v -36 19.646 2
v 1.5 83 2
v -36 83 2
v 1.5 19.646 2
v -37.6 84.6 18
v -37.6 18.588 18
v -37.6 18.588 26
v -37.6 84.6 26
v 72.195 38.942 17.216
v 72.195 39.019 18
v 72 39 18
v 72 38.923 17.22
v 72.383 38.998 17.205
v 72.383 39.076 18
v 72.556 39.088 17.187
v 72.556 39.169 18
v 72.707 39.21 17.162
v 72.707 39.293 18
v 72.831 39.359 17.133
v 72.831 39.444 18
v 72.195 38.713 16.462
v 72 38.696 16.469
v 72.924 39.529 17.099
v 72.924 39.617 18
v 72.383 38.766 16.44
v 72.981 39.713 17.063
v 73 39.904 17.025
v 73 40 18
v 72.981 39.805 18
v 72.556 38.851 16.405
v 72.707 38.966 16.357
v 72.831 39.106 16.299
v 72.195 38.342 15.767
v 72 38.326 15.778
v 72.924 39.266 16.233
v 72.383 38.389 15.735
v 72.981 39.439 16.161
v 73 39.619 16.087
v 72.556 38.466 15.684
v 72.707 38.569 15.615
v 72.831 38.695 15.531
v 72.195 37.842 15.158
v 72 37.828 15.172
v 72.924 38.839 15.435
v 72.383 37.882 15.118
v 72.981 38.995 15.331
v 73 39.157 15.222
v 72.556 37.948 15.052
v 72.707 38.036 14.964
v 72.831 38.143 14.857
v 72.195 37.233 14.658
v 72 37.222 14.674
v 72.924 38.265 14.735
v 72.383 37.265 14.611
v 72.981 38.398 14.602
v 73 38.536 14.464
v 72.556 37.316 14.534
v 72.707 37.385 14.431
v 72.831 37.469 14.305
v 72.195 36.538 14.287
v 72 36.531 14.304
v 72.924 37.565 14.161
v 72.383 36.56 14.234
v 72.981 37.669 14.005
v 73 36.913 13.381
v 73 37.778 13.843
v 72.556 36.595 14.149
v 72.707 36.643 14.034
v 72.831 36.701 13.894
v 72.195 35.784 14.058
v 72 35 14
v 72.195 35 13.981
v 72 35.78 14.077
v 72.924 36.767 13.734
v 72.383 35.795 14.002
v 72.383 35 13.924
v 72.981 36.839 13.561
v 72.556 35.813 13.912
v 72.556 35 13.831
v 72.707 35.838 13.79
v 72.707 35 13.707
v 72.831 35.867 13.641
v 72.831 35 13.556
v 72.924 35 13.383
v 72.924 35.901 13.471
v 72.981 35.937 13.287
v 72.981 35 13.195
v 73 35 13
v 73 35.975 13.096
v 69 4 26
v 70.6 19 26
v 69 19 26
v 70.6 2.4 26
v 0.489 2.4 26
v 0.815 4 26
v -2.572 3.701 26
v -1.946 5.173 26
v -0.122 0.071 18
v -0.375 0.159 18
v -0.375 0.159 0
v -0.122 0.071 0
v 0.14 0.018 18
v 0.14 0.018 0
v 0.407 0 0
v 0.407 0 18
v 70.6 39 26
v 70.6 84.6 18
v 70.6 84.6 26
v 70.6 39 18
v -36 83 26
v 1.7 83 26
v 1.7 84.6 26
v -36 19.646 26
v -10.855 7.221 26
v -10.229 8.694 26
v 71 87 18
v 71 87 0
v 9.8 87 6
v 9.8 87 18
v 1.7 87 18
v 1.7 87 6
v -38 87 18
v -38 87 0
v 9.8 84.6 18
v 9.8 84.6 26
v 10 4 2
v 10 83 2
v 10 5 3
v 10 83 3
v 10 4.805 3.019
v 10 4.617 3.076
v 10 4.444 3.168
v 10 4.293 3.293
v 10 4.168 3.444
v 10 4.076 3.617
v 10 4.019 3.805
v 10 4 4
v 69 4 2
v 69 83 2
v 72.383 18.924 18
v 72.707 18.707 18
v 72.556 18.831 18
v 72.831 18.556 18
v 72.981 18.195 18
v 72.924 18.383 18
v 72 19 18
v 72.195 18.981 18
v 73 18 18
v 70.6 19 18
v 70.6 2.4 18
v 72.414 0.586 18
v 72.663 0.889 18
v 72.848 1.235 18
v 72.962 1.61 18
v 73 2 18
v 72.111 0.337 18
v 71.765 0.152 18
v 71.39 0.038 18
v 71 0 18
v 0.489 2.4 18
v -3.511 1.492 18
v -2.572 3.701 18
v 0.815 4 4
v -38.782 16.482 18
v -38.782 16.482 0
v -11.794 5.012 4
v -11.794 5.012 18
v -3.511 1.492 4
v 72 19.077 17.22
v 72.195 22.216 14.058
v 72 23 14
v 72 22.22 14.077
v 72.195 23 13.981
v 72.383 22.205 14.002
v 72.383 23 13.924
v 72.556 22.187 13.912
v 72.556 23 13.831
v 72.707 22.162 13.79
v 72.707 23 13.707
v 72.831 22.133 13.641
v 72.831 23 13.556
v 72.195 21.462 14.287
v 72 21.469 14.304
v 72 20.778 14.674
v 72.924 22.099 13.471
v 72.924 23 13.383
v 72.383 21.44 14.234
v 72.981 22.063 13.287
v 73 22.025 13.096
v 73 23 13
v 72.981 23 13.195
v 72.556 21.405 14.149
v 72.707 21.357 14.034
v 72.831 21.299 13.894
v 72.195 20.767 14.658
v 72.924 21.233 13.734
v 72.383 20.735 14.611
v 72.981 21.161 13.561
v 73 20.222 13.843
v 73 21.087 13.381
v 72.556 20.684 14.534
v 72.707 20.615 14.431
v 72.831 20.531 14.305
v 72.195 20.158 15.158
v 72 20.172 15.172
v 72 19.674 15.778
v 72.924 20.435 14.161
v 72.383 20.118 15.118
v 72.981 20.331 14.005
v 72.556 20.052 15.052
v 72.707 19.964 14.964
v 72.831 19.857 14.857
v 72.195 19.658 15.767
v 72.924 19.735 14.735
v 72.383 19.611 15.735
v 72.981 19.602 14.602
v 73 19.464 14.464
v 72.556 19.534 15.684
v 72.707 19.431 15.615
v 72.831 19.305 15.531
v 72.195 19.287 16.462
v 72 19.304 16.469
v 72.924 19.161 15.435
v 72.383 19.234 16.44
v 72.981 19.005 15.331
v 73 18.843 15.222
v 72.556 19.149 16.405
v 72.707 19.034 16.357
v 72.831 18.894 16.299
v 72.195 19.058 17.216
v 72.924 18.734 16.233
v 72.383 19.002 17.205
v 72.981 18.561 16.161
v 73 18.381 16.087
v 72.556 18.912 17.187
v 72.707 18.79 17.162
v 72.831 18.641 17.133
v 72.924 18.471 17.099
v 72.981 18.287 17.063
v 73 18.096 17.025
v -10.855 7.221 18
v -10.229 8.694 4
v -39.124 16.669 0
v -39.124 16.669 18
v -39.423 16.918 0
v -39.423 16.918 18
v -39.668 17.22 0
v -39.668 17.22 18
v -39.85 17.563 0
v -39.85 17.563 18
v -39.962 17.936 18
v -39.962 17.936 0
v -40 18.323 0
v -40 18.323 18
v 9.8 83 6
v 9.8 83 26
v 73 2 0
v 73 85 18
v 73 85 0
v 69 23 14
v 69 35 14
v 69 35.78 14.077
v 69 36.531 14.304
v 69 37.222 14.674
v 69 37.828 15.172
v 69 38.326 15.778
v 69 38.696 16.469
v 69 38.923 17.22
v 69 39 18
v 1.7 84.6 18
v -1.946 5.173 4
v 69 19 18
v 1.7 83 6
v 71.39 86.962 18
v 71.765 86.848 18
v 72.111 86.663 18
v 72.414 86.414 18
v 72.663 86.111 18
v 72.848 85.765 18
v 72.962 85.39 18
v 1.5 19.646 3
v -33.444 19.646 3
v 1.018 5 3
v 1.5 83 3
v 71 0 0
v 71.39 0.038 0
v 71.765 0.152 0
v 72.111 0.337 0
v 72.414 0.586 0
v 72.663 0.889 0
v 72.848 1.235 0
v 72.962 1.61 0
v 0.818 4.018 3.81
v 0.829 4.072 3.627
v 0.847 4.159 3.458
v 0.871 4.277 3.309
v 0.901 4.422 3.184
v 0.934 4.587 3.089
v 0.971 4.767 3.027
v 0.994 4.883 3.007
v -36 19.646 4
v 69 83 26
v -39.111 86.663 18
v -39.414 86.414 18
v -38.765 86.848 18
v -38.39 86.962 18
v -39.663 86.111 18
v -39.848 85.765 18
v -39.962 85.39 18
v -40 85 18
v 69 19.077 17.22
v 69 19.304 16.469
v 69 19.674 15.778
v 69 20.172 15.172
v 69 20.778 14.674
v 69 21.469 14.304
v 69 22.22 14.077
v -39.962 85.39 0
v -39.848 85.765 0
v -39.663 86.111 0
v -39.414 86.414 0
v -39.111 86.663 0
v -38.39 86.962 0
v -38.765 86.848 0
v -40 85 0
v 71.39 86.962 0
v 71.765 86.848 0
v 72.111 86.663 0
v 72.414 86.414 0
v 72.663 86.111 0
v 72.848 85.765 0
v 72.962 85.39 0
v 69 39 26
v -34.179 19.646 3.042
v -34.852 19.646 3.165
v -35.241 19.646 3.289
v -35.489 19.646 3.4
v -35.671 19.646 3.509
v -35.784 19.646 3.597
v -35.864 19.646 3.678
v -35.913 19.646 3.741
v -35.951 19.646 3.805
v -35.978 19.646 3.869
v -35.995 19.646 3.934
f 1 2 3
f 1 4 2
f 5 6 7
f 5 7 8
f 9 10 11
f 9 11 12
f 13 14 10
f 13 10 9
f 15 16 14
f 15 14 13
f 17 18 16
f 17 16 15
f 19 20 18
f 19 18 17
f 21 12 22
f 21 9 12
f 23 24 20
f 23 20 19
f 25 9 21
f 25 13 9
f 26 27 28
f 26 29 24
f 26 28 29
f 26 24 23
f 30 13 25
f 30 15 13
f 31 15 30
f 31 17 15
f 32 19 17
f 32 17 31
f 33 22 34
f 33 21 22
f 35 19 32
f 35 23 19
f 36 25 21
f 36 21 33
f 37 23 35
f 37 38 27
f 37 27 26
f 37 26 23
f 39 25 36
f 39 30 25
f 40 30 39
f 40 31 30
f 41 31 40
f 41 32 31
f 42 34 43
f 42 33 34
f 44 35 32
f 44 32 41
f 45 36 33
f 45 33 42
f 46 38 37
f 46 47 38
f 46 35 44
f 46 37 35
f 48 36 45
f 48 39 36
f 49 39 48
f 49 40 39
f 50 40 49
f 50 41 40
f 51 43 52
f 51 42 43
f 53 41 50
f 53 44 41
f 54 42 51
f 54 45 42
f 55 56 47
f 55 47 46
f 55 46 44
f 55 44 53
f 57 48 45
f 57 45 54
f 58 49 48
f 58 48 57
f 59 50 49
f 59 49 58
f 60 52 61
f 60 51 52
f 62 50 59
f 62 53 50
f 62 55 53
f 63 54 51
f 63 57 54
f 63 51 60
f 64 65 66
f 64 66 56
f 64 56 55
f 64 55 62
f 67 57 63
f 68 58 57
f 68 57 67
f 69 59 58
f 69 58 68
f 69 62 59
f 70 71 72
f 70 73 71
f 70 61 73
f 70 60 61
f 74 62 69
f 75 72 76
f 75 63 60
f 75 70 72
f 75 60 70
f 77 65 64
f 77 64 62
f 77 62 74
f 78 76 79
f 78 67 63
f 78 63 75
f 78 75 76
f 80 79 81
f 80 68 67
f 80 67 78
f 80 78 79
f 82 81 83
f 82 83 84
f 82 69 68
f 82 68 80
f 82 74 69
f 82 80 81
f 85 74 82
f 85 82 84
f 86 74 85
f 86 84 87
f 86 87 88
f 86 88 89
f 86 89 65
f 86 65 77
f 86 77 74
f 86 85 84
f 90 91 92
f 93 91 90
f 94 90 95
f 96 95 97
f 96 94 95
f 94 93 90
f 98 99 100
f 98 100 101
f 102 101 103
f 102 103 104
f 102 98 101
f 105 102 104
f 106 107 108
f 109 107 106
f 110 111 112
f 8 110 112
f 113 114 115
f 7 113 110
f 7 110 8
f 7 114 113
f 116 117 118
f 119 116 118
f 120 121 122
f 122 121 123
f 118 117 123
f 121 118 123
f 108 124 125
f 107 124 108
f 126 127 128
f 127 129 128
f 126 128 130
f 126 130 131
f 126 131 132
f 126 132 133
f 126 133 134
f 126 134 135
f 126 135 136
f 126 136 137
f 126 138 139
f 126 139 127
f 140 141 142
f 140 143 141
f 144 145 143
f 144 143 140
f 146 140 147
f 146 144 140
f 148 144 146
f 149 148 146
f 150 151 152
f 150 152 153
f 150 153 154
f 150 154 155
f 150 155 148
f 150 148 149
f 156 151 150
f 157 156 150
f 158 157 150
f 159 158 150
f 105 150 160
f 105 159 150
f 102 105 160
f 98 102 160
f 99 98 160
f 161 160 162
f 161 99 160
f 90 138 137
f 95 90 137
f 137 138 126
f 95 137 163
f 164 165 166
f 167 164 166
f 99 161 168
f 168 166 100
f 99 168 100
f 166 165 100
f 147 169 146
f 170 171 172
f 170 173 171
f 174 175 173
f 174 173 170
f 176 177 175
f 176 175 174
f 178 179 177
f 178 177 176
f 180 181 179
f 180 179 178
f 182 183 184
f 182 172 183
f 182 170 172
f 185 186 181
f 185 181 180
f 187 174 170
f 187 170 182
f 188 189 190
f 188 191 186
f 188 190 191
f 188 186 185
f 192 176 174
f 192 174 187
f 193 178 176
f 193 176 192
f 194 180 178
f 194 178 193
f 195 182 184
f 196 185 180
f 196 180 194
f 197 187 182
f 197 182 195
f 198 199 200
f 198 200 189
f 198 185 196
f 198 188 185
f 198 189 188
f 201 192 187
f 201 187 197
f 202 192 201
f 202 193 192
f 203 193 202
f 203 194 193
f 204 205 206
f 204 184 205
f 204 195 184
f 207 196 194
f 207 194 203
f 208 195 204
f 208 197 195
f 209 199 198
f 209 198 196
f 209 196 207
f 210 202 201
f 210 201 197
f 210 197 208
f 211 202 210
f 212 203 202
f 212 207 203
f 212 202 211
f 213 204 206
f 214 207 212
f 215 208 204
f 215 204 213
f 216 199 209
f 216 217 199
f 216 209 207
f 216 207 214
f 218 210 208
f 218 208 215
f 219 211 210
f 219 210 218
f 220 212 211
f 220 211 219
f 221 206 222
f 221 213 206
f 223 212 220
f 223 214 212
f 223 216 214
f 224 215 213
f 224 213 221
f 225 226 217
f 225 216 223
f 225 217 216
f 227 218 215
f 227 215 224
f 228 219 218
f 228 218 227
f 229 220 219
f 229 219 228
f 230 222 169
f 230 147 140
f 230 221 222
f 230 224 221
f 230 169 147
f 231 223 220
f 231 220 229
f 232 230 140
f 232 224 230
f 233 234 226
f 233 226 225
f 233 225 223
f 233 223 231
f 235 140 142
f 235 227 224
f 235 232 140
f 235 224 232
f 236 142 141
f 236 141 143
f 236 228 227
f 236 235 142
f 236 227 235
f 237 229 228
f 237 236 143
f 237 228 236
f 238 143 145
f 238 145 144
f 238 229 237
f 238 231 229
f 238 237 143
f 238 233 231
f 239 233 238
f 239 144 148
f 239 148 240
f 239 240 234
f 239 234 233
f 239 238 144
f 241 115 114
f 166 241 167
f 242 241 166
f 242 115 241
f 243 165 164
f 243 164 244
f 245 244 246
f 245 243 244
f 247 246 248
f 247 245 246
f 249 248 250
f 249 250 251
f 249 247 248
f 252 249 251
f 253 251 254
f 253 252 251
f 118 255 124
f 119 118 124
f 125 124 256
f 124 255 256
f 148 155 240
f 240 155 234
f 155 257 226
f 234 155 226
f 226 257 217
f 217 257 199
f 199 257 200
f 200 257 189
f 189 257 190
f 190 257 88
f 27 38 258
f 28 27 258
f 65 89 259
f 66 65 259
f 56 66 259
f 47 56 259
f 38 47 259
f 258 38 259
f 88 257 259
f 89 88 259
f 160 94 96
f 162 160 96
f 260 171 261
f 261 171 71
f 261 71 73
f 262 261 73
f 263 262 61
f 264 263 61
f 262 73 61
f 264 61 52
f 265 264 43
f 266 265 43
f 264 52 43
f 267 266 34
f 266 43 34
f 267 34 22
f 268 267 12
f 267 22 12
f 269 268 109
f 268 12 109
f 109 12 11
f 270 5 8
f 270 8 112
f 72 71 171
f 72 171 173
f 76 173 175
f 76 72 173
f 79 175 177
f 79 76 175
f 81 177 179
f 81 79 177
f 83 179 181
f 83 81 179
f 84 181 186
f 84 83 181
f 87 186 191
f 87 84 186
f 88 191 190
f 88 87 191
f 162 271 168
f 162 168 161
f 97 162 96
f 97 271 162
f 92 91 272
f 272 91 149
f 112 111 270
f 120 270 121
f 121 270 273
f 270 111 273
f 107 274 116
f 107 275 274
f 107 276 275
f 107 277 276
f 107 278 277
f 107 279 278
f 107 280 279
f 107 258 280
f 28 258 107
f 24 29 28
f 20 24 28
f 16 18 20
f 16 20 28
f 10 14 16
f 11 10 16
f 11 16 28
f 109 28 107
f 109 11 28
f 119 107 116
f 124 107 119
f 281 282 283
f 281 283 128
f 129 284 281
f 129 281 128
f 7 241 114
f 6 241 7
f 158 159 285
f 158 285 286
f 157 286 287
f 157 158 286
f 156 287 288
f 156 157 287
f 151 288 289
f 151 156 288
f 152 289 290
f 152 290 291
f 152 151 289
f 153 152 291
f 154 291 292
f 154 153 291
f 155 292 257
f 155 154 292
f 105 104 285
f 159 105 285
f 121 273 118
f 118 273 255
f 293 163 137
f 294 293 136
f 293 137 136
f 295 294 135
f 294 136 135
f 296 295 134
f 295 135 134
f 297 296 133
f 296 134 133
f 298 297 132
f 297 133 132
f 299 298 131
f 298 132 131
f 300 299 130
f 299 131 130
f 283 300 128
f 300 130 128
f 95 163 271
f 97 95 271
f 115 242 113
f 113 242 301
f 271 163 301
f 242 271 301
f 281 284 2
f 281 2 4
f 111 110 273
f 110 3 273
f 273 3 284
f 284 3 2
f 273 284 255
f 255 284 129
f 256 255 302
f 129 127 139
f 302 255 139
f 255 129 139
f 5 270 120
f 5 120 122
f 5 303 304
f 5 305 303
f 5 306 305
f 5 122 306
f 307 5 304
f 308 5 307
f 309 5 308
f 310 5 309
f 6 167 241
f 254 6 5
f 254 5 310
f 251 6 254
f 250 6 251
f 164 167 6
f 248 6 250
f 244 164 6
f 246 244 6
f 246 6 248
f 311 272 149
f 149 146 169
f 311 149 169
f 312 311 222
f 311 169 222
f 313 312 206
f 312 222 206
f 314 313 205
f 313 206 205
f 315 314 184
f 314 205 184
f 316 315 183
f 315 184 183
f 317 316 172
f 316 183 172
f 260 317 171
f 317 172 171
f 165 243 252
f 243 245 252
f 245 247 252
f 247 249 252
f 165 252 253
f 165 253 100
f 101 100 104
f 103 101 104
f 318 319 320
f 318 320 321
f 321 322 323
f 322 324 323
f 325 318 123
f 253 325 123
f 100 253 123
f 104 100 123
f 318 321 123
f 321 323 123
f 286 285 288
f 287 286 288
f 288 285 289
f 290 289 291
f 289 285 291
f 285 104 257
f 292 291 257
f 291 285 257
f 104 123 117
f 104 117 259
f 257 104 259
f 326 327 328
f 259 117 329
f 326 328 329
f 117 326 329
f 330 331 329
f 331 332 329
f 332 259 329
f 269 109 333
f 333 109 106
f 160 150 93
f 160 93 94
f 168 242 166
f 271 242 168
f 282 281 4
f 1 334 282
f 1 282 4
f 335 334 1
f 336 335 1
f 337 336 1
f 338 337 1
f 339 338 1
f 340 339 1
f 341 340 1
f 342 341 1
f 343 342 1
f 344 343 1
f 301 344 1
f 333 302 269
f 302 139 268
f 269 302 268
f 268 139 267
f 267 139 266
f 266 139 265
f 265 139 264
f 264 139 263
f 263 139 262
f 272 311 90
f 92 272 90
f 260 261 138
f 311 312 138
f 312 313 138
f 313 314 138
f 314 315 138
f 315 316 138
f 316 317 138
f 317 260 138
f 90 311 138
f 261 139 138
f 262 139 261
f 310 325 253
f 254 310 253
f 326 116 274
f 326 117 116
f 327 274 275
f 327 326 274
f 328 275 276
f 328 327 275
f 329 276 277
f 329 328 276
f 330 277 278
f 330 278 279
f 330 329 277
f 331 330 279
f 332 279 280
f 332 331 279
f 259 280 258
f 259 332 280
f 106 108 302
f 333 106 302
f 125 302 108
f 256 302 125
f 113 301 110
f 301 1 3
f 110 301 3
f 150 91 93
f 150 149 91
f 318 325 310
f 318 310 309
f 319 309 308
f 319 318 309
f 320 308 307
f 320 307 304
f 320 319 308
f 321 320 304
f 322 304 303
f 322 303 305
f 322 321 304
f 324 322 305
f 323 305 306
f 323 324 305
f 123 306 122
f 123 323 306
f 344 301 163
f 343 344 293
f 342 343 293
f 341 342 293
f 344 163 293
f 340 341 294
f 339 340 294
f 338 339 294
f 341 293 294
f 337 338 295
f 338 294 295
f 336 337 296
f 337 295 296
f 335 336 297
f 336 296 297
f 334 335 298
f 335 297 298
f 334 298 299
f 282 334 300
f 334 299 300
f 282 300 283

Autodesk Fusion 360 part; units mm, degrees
sketch "Esquisse1" plane through (0, 0, 0) normal (0, 0, 1) x (1, 0, 0)
  line L0 (0, 0) -> (73, 0)
  line L1 (73, 0) -> (73, 87)
  line L2 (73, 87) -> (-40, 87)
  line L3 (-40, 87) -> (-40, 17)
  line L4 (-40, 17) -> (0, 0)
  dimension "d5" = 87
  dimension "d6" = 113
  dimension "d7" = 70
  dimension "d8" = 73
extrude "Extrusion1" add sketch "Esquisse1" along normal blind 3
sketch "Esquisse2" plane through (0, 0, 3) normal (0, 0, 1) x (-1, 0, 0)
  line L0 (40, -17) -> (0, 0)
  line L1 (0, 0) -> (-73, 0)
  line L2 (-73, 0) -> (-73, -87)
  line L3 (-73, -87) -> (40, -87)
  line L4 (40, -87) -> (40, -17)
  line L5 (-0.8147, -4) -> (-69, -4)
  line L6 (-69, -4) -> (-69, -83)
  line L7 (-69, -83) -> (36, -83)
  line L8 (36, -83) -> (36, -19.6463)
  line L9 (36, -19.6463) -> (-0.8147, -4)
  dimension "d11" = 4
  dimension "d12" = 4
  dimension "d13" = 4
  dimension "d14" = 4
  dimension "d15" = 4
extrude "Extrusion2" add sketch "Esquisse2" along normal blind 15
sketch "Esquisse3" plane through (0, 0, 18) normal (0, 0, 1) x (-1, 0, 0)
  line L0 (-0.8147, -4) -> (36, -19.6463)
  line L1 (36, -19.6463) -> (36, -83)
  line L2 (36, -83) -> (-69, -83)
  line L3 (-69, -83) -> (-69, -4)
  line L4 (-69, -4) -> (-0.8147, -4)
  line L5 (40, -87) -> (40, -17)
  line L6 (40, -17) -> (0, 0)
  line L7 (0, 0) -> (-73, 0)
  line L8 (-73, 0) -> (-73, -87)
  line L9 (-73, -87) -> (40, -87)
  line L10 (37.6, -84.6) -> (-70.6, -84.6)
  line L11 (-70.6, -84.6) -> (-70.6, -2.4)
  line L12 (-70.6, -2.4) -> (-0.4888, -2.4)
  line L13 (-0.4888, -2.4) -> (37.6, -18.5878)
  line L14 (37.6, -18.5878) -> (37.6, -84.6)
  dimension "d18" = 1.6
  dimension "d19" = 1.6
  dimension "d20" = 1.6
  dimension "d21" = 1.6
  dimension "d22" = 1.6
extrude "Extrusion3" add sketch "Esquisse3" along normal blind 8 contours L10 L11 L12 L13 L14
sketch "Esquisse4" plane through (0, 0, 3) normal (0, 0, 1) x (-1, 0, 0)
  line L0 (-0.8147, -4) -> (-69, -4)
  line L1 (-69, -4) -> (-69, -83)
  line L2 (-69, -83) -> (36, -83)
  line L3 (36, -83) -> (36, -19.6463)
  line L4 (36, -19.6463) -> (-0.8147, -4)
  line L5 (-69, -83) -> (-10, -83)
  line L6 (-10, -83) -> (-10, -4)
  line L7 (-10, -4) -> (-69, -4)
  line L8 (-69, -4) -> (-69, -83)
  line L9 (36, -83) -> (-1.5, -83)
  line L10 (-1.5, -83) -> (-1.5, -19.6463)
  line L11 (-1.5, -19.6463) -> (36, -19.6463)
  line L12 (36, -19.6463) -> (36, -83)
  dimension "d25" = 59
  dimension "d27" = 37.5
extrude "Extrusion4" cut sketch "Esquisse4" against normal blind 1 contours L0 L1 L2 L5 L6 L7 L8 | L2 L3 L9 L10 L11 L12
sketch "Esquisse5" plane through (73, 0, 0) normal (1, 0, 0) x (0, 1, 0)
  line L0 (0, 0) -> (87, 0)
  line L1 (87, 0) -> (87, 18)
  line L2 (87, 18) -> (0, 18)
  line L3 (0, 18) -> (0, 0)
  line L4 (23, 14) -> (35, 14)
  arc A0 (35, 14) -> (35, 22) centre (35, 18) ccw
  line L5 (35, 22) -> (23, 22)
  arc A1 (23, 22) -> (23, 14) centre (23, 18) ccw
  line L6 (19, 18) -> (39, 18)
  line L7 (39, 18) -> (39, 26)
  line L8 (39, 26) -> (19, 26)
  line L9 (19, 26) -> (19, 18)
  line L10 (2.4, 26) -> (84.6, 26)
  dimension "d34" = 8
  dimension "d35" = 12
  dimension "d36" = 23
  dimension "d37" = 14
  dimension "d38" = 4
extrude "Extrusion5" cut sketch "Esquisse5" against normal blind 5 contours L2 A0 L5 A1 L6 | A0 L5 A1 L7 L8 L9 L10 | L2 L4 A0 A1 L6
sketch "Esquisse10" plane through (1.5646, 3.6813, 0) normal (0.391141, 0.920331, 0) x (-0.920331, 0.391141, 0)
  line L0 (0.8147, 3) -> (40.8164, 3)
  line L1 (40.8164, 3) -> (40.8164, 26)
  line L2 (40.8164, 26) -> (0.8147, 26)
  line L3 (0.8147, 26) -> (0.8147, 3)
  line L4 (3.8147, 26) -> (12.8147, 26)
  line L5 (12.8147, 26) -> (12.8147, 4)
  line L6 (12.8147, 4) -> (3.8147, 4)
  line L7 (3.8147, 4) -> (3.8147, 26)
  dimension "d55" = 9
  dimension "d56" = 22
  dimension "d57" = 3
extrude "Extrusion8" cut sketch "Esquisse10" against normal blind 5 contours L2 L4 L5 L6 L7
sketch "Esquisse11" plane through (0, 83, 0) normal (0, -1, 0) x (1, 0, 0)
  line L0 (69, 2) -> (69, 26)
  line L1 (69, 26) -> (-36, 26)
  line L2 (-36, 26) -> (-36, 2)
  line L3 (1.5, 2) -> (1.5, 3)
  line L4 (1.5, 3) -> (10, 3)
  line L5 (10, 3) -> (10, 2)
  line L6 (9.8, 26) -> (1.7, 26)
  line L7 (1.7, 26) -> (1.7, 6)
  line L8 (1.7, 6) -> (9.8, 6)
  line L9 (9.8, 6) -> (9.8, 26)
  line L10 (-36, 2) -> (1.5, 2)
  line L11 (10, 2) -> (69, 2)
  dimension "d60" = 8.1
  dimension "d61" = 20
  dimension "d62" = 0.2
extrude "Extrusion9" cut sketch "Esquisse11" against normal blind 5 contours L1 L6 L7 L8 L9
fillet "Congé1" radius 2 5 edges at (0, 0, 9) (73, 0, 9) (-40, 17, 9) (73, 87, 9) (-40, 87, 9)
fillet "Congé2" radius 1 2 edges at (-17.5926, 11.8231, 3) (5.4074, 4, 3)
fillet "Congé3" radius 1 3 edges at (73, 37.8284, 15.1716) (73, 29, 14) (73, 20.1716, 15.1716)
equation "d16 = 20 mm - 5 mm"
